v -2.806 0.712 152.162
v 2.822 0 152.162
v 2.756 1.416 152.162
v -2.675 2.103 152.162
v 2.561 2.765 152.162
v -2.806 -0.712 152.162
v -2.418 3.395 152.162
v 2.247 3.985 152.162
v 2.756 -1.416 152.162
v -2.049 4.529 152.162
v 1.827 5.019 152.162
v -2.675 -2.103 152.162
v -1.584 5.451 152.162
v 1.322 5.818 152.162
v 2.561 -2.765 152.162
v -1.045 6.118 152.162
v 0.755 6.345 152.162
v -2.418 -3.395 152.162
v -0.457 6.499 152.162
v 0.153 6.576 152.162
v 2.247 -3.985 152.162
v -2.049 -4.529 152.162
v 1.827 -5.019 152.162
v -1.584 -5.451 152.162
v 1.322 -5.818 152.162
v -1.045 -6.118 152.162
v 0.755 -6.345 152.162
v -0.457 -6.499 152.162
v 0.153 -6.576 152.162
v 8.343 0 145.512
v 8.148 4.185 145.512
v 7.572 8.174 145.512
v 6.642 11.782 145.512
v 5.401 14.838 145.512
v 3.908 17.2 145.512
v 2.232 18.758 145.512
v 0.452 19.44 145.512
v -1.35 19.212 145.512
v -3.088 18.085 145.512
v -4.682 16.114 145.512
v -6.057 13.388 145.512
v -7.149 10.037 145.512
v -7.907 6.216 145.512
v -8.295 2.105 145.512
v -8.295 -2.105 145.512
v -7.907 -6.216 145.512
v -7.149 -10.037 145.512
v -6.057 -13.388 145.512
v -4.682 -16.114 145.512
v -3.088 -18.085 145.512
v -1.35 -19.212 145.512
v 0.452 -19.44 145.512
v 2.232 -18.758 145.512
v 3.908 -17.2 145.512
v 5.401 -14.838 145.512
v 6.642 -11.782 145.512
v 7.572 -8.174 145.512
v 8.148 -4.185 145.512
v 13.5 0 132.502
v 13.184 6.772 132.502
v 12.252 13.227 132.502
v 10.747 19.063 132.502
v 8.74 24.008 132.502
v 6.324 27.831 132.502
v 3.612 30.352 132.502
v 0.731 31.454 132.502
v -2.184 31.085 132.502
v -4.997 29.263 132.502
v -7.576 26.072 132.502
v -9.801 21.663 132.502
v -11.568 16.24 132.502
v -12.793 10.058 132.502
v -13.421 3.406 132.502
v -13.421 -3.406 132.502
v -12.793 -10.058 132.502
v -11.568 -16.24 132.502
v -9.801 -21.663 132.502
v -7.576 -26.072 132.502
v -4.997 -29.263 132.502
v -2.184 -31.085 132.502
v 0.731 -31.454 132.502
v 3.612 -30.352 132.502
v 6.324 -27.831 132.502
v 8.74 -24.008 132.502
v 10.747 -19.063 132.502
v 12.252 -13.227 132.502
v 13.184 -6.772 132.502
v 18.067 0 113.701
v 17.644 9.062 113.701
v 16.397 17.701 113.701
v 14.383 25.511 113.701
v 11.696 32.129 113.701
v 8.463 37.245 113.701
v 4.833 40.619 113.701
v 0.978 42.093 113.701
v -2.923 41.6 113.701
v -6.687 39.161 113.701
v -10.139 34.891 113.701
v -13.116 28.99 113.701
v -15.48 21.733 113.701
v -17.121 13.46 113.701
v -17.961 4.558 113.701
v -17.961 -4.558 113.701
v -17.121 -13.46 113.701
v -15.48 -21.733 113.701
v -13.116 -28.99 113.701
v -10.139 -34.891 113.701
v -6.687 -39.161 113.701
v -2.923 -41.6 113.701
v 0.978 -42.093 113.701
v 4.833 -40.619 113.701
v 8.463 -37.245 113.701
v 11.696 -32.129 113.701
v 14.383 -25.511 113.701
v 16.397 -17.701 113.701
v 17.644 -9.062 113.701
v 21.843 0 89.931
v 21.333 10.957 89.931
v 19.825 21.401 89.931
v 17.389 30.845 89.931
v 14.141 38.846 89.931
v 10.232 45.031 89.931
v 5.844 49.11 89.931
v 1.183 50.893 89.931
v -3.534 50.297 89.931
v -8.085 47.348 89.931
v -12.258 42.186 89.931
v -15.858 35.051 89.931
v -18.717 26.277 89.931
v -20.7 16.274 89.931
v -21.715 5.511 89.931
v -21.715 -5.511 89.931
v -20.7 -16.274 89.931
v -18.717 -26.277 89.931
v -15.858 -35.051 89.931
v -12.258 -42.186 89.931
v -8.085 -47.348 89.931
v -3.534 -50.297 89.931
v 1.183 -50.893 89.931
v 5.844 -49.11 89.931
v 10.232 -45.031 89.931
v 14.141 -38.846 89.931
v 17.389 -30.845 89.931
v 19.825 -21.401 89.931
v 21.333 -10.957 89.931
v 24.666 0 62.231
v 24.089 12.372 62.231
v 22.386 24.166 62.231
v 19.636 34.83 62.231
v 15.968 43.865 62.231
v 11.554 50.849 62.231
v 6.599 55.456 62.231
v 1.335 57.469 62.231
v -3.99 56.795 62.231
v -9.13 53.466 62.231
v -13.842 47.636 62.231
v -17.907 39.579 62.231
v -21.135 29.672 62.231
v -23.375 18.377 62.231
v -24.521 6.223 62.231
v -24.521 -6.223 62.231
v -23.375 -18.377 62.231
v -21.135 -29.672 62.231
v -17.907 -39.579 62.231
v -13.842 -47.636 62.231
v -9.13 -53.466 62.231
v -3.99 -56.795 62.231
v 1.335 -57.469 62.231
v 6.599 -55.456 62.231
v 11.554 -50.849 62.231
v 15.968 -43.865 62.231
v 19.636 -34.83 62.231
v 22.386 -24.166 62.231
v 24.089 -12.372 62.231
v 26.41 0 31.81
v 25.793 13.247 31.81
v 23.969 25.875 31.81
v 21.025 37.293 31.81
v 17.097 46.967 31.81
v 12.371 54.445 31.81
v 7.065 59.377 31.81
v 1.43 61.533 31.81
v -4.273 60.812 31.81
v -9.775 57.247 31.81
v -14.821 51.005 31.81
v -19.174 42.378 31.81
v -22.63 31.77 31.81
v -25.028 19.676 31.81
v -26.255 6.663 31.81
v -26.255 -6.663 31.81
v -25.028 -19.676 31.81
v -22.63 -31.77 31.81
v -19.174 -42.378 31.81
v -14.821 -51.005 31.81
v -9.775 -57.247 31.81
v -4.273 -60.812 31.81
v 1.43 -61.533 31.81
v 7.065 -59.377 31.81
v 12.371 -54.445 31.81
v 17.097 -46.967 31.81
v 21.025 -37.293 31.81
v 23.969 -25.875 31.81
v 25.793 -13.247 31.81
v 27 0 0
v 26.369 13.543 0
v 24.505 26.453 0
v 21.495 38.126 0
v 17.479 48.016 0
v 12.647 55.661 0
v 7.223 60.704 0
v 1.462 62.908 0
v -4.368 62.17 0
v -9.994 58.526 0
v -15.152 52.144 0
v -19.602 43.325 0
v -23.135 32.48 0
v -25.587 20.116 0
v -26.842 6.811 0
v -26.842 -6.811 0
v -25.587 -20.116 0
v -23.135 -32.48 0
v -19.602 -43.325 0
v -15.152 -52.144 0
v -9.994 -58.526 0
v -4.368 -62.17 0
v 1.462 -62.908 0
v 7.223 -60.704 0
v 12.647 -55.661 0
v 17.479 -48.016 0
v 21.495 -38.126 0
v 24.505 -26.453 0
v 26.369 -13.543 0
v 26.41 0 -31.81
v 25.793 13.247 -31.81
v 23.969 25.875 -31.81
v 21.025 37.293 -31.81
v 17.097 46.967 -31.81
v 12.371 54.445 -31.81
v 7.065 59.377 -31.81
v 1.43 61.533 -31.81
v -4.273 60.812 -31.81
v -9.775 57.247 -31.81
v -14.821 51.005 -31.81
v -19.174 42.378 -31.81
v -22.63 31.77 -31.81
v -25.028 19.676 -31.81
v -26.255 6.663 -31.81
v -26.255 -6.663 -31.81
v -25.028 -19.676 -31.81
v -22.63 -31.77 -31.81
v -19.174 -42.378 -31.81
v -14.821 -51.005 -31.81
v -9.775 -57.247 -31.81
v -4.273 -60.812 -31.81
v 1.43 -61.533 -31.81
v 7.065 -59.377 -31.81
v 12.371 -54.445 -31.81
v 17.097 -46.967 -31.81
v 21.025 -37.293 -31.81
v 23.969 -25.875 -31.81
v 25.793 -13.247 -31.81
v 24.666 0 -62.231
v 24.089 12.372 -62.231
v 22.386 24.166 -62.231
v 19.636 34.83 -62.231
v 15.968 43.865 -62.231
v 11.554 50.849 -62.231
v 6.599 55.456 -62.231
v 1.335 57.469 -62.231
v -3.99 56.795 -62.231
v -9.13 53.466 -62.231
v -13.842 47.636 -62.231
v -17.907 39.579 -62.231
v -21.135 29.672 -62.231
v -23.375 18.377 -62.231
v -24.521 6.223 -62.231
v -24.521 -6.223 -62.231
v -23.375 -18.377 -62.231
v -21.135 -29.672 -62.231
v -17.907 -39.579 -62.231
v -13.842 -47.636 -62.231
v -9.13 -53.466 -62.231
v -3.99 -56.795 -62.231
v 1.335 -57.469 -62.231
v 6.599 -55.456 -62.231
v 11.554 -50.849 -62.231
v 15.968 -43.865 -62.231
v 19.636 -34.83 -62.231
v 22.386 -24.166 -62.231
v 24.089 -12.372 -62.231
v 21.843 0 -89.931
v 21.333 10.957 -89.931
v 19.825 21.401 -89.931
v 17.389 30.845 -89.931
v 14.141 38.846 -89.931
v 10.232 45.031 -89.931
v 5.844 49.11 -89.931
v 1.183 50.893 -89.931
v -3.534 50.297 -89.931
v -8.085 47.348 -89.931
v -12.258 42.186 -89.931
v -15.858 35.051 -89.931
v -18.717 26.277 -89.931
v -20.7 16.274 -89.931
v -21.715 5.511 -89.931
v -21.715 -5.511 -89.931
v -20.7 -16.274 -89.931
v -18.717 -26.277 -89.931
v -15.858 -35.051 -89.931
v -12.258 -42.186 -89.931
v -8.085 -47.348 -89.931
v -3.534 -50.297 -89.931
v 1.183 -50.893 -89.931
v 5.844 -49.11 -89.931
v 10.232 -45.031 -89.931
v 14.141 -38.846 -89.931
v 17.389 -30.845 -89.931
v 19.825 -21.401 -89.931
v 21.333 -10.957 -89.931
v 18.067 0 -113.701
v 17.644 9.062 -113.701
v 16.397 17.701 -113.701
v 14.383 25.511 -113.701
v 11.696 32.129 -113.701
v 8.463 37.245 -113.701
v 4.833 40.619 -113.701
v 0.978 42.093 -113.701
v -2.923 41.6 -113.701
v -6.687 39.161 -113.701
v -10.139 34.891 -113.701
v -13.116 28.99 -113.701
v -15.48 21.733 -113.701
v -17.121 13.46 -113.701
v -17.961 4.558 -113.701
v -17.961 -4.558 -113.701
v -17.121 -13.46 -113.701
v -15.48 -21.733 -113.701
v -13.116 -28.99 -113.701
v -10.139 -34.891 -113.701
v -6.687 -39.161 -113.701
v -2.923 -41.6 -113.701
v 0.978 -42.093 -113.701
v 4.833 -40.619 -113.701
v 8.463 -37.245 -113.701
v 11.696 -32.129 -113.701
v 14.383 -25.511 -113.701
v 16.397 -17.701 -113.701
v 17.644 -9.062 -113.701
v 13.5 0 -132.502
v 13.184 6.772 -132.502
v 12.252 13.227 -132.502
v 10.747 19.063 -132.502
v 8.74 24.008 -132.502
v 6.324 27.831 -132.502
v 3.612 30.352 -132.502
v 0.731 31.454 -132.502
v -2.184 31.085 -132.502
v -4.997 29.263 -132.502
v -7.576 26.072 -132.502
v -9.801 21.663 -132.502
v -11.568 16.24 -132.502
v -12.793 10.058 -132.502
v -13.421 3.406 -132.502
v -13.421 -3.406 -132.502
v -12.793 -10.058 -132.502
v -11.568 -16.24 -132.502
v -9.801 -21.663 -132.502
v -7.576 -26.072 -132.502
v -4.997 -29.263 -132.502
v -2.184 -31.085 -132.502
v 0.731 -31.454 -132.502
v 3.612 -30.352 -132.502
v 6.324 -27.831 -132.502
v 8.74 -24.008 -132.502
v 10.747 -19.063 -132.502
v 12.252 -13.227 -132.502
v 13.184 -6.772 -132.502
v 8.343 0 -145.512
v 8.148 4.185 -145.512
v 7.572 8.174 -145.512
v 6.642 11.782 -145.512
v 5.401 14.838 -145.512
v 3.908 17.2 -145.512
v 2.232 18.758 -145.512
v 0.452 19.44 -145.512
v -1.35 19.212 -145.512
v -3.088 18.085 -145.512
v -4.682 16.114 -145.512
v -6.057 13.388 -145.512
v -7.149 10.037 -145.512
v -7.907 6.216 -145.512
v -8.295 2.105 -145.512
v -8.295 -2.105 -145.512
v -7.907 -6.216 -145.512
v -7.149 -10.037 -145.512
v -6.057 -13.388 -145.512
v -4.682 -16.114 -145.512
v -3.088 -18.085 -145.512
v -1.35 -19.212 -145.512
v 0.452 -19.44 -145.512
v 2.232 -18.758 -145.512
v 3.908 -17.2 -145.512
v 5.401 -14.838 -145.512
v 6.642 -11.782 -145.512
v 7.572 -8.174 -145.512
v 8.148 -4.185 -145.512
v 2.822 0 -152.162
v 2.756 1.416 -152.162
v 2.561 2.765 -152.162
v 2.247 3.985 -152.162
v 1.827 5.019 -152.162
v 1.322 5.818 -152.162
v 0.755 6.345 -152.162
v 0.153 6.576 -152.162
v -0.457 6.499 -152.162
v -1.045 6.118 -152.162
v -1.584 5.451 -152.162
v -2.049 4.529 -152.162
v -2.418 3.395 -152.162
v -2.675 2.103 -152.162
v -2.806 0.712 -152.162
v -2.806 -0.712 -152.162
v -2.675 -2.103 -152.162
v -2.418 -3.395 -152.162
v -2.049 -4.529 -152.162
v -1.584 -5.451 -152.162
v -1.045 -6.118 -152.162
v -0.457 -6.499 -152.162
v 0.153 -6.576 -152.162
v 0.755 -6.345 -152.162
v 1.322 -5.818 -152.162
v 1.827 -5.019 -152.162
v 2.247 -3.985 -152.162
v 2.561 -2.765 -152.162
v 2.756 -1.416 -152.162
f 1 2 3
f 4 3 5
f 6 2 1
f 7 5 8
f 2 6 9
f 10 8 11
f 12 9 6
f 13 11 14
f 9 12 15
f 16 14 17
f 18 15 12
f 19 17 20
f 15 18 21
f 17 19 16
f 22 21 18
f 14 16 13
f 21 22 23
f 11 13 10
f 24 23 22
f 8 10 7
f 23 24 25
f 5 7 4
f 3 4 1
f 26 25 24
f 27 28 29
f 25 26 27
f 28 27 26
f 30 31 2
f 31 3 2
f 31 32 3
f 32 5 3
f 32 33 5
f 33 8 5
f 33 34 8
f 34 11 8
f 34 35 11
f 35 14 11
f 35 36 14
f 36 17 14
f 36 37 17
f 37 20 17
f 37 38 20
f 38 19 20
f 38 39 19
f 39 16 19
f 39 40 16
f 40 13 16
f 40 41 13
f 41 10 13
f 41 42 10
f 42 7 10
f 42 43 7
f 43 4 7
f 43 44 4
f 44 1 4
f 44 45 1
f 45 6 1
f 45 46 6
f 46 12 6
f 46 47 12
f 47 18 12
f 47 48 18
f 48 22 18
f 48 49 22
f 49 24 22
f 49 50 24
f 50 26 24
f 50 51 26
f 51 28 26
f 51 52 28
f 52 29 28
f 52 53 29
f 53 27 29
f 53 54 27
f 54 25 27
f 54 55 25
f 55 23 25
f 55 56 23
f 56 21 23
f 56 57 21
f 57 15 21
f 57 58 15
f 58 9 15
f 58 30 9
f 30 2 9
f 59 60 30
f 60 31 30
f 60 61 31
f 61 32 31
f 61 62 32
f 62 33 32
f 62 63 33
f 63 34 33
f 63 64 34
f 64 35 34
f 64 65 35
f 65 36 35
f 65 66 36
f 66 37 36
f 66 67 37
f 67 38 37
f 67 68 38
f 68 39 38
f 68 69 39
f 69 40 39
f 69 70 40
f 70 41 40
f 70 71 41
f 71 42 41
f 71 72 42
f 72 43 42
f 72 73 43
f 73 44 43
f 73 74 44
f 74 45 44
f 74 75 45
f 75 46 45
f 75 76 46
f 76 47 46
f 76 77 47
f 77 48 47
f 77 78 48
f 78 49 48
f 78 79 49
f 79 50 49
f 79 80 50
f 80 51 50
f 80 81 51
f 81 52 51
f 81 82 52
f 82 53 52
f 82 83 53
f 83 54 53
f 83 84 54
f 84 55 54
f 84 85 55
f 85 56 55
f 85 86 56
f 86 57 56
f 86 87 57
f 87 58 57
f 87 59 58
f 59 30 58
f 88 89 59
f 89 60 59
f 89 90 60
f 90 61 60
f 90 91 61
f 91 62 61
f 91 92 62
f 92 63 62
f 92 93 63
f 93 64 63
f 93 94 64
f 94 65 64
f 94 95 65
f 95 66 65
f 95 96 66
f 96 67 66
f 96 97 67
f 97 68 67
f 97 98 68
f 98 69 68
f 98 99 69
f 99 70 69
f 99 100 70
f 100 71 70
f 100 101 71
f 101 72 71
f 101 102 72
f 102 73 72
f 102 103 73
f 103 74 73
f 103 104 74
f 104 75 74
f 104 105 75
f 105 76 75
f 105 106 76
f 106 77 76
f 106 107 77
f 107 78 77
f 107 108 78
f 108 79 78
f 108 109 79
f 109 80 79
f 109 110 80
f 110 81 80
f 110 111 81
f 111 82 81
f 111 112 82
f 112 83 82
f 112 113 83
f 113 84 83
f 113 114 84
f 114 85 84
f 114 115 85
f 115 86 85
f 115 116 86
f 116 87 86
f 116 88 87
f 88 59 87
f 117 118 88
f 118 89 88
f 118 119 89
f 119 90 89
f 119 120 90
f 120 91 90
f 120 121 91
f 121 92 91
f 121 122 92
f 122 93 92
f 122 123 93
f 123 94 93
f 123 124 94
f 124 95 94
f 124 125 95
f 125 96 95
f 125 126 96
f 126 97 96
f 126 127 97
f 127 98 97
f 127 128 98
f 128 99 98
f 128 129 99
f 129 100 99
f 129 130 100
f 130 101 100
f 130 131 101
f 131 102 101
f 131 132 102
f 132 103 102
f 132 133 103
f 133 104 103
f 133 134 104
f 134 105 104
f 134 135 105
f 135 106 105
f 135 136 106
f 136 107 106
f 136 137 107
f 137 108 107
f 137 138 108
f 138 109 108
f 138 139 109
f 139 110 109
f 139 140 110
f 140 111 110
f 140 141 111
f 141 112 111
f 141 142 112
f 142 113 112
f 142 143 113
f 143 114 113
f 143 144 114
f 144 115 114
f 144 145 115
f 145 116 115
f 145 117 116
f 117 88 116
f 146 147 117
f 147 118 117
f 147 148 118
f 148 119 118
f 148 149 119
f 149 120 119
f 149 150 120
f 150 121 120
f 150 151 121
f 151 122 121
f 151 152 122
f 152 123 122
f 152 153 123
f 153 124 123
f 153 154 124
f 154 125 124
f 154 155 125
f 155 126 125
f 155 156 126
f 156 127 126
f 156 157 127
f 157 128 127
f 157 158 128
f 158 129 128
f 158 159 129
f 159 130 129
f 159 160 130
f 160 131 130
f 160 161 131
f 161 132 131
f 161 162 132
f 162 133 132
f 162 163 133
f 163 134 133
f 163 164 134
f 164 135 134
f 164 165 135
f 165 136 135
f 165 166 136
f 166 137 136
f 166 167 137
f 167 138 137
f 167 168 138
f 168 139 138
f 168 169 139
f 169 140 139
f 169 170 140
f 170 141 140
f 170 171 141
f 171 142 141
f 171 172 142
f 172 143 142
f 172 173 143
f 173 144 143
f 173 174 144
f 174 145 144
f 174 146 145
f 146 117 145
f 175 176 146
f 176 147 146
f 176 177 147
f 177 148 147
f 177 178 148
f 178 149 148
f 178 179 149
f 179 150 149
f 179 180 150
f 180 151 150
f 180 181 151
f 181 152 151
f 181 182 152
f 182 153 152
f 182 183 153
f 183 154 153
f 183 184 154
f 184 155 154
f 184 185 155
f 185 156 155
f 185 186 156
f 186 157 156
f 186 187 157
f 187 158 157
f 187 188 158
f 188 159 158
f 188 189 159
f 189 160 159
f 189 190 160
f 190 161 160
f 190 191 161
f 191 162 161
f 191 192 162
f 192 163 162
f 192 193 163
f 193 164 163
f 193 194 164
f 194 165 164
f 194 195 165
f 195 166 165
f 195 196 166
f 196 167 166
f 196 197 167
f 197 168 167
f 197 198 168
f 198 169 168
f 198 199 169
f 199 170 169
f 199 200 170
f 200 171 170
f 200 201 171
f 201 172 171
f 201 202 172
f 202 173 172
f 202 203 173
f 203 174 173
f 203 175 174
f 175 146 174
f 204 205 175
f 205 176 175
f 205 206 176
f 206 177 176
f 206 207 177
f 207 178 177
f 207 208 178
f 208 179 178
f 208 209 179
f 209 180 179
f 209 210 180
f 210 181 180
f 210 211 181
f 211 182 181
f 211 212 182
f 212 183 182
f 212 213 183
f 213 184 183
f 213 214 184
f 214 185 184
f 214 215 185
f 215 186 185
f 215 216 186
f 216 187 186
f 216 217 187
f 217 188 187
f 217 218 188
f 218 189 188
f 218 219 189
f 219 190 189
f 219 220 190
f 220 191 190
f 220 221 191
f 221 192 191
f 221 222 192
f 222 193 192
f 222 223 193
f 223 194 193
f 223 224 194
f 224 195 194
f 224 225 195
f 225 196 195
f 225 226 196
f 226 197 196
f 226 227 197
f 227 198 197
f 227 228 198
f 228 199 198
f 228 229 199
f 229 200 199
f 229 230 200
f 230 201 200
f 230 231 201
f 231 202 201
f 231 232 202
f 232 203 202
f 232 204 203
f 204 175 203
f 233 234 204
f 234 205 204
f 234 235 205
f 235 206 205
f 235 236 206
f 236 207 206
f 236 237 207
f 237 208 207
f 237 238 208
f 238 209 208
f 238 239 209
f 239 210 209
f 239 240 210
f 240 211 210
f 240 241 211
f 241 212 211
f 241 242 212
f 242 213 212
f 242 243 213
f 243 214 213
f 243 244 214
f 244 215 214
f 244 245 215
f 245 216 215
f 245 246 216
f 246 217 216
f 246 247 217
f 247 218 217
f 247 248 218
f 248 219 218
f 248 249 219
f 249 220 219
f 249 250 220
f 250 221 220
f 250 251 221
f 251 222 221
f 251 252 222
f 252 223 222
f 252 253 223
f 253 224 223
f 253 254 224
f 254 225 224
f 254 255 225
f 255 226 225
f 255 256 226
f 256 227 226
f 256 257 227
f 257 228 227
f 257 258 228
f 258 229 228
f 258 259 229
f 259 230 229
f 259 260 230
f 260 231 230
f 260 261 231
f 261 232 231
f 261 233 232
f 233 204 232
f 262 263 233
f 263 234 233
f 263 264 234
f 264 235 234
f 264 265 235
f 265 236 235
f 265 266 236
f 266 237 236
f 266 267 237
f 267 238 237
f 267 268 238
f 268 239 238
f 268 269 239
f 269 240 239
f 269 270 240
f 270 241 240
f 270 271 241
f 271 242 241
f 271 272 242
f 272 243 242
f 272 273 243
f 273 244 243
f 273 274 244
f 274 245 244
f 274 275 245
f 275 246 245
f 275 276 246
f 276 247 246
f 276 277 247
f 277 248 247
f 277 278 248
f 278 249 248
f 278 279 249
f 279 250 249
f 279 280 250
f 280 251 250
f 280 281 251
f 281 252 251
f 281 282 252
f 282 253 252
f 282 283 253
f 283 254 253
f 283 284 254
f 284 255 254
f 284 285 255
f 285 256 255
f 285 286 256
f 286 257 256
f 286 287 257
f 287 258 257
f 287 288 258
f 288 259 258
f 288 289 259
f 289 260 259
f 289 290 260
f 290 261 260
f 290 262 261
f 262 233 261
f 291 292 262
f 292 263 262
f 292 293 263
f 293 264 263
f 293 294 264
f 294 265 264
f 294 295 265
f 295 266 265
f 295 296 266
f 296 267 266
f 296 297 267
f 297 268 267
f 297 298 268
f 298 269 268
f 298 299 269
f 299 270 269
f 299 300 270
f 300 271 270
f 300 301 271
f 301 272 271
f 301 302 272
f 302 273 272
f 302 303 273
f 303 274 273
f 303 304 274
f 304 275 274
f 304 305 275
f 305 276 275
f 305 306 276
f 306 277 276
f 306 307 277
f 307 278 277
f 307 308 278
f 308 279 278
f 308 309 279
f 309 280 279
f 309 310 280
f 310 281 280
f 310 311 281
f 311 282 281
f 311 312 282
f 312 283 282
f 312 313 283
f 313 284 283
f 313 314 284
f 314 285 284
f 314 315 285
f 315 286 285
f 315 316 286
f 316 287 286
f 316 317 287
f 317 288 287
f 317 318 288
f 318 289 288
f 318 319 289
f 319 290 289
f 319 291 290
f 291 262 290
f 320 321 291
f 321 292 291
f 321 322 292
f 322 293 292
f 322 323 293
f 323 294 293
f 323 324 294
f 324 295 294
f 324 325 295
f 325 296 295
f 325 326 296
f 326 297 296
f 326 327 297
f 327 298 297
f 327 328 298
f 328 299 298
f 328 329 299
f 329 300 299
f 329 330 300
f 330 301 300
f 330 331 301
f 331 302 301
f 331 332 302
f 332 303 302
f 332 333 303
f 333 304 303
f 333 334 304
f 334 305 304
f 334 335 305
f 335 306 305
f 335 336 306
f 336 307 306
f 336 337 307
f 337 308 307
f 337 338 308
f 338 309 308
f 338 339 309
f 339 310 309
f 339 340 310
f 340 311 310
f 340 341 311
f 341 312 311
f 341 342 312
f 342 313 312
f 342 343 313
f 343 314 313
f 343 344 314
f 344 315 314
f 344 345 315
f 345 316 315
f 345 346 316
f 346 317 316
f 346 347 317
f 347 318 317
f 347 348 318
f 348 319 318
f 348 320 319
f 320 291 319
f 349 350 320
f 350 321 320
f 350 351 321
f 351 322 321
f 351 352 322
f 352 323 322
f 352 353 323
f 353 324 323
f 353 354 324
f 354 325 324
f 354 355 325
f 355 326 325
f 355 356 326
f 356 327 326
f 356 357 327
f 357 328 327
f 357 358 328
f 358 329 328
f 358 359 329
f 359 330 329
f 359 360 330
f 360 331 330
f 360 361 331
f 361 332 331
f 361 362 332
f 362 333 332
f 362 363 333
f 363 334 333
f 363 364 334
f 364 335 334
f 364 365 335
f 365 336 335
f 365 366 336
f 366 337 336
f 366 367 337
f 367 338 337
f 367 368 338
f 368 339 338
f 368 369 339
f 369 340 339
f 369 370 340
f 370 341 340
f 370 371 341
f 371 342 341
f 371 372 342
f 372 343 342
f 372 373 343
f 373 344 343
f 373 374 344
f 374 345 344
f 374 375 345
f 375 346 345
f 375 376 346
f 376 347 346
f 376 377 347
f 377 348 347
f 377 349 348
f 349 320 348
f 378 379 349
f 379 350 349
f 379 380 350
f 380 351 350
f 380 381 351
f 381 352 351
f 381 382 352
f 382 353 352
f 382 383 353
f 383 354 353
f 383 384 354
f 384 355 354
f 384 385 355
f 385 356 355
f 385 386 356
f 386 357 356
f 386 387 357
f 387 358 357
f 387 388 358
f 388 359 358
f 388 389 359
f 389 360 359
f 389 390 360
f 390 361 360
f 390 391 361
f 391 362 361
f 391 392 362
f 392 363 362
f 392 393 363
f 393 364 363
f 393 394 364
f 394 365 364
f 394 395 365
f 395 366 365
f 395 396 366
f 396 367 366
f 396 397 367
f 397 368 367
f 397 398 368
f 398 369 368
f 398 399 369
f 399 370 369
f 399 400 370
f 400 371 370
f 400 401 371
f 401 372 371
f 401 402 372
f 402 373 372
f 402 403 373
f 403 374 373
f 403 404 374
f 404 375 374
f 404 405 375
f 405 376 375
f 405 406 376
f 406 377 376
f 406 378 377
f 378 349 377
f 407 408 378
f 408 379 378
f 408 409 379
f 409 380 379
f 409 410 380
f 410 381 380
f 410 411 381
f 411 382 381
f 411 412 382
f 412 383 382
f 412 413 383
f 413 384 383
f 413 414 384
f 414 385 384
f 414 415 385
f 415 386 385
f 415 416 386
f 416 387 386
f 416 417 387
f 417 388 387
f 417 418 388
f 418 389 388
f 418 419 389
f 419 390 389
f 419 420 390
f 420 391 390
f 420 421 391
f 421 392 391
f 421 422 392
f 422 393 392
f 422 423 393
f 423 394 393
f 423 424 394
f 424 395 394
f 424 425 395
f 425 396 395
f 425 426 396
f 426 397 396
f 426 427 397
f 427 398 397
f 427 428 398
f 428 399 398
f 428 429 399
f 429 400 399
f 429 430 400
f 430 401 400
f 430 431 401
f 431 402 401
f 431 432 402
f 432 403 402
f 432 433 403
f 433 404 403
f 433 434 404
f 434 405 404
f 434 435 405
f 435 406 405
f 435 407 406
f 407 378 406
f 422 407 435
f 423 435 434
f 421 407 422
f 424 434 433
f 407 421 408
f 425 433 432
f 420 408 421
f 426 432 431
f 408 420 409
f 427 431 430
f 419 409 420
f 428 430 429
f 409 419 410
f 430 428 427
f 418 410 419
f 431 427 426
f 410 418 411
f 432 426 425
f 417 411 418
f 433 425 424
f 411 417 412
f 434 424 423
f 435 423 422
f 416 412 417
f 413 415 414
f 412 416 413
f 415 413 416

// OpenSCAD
// Generated by SolidPython 1.0.1 on 2020-07-29 00:46:45


scale(v = [3, 7, 17]) {
	sphere(r = 9);
}
/***********************************************
*********      SolidPython code:      **********
************************************************
 
# import packages: SolidPython
from solid import *
from solid.utils import *
from itertools import chain, combinations, permutations


class Resize:

    def __init__(self, scad_file):
        self.scad_file = scad_file
        #self.scad_file = import_scad(scad_file)
        # cone/cylinder param:
        self.r1 = 0
        self.r2 = 0
        self.h = 0
        # rectangular prism param:
        self.w = 0
        self.l = 0
        # ellipse param:
        self.r = 0

    # import OpenScad code (file name corresponds to shape)


    # classify shape + parameters
    def assign(self, param1, param2, param3):
        if self.scad_file == 'cone.scad':
            self.r1 = param1
            self.r2 = param2
            self.h = param3
        elif self.scad_file == 'cylinder.scad':
            self.r1 = param1
            self.r2 = param2
            self.h = param3
        elif self.scad_file == 'rectangularPrism.scad':
            self.h = param1
            self.l = param2
            self.w = param3
        else:
            self.r = param1
            self.h = param2

    # resize parameters
    def iterate(self):
        x = range(3, 20, 2)
        i = 1
        if self.scad_file == 'cone.scad':
            tempList = list(permutations(x, 2))
            for temp in tempList:
                param1 = temp[0]
                param2 = temp[1]
                filepath = 'produced_scad_files/' + 'cone' + str(param1) + '_' + str(param2) + '_' + '.scad'
                scad_render_to_file(cylinder(h=param1, r1=param2, r2=0), filepath)

        elif self.scad_file == 'cylinder.scad':
            tempList = list(permutations(x, 3))
            for temp in tempList:
                param1 = temp[0]
                param2 = temp[1]
                filepath = 'produced_scad_files/' + 'cylinder' + str(param1) + '_' + str(param2) + '_' + '.scad'
                scad_render_to_file(cylinder(h=param1, r1=param2, r2=param2), filepath)

        elif self.scad_file == 'rectangularPrism.scad':
            tempList = list(permutations(x, 3))
            for temp in tempList:
                param1 = temp[0]
                param2 = temp[1]
                param3 = temp[2]
                filepath = 'produced_scad_files/' + 'rectangularPrism' + str(param1) + '_' + str(param2) + '_' + str(
                    param3) + '.scad'
                scad_render_to_file(cube(size=(param1, param2, param3)), filepath)

        elif self.scad_file == 'ellipse.scad':
            tempList = list(permutations(x, 4))
            for temp in tempList:
                param1 = temp[0]
                param2 = temp[1]
                param3 = temp[2]
                param4 = temp[3]
                filepath = 'produced_scad_files/' + 'ellipse' + str(param1) + '_' + str(param2) + '_' + str(param3) + '_' + str(param4) + '.scad'
                scad_render_to_file(scale([param1, param2, param3])(sphere(r=param4)), filepath)

    def render_to_scadfile(self):
        scad_render_to_file(scad, 'example.scad') 
 
************************************************/
